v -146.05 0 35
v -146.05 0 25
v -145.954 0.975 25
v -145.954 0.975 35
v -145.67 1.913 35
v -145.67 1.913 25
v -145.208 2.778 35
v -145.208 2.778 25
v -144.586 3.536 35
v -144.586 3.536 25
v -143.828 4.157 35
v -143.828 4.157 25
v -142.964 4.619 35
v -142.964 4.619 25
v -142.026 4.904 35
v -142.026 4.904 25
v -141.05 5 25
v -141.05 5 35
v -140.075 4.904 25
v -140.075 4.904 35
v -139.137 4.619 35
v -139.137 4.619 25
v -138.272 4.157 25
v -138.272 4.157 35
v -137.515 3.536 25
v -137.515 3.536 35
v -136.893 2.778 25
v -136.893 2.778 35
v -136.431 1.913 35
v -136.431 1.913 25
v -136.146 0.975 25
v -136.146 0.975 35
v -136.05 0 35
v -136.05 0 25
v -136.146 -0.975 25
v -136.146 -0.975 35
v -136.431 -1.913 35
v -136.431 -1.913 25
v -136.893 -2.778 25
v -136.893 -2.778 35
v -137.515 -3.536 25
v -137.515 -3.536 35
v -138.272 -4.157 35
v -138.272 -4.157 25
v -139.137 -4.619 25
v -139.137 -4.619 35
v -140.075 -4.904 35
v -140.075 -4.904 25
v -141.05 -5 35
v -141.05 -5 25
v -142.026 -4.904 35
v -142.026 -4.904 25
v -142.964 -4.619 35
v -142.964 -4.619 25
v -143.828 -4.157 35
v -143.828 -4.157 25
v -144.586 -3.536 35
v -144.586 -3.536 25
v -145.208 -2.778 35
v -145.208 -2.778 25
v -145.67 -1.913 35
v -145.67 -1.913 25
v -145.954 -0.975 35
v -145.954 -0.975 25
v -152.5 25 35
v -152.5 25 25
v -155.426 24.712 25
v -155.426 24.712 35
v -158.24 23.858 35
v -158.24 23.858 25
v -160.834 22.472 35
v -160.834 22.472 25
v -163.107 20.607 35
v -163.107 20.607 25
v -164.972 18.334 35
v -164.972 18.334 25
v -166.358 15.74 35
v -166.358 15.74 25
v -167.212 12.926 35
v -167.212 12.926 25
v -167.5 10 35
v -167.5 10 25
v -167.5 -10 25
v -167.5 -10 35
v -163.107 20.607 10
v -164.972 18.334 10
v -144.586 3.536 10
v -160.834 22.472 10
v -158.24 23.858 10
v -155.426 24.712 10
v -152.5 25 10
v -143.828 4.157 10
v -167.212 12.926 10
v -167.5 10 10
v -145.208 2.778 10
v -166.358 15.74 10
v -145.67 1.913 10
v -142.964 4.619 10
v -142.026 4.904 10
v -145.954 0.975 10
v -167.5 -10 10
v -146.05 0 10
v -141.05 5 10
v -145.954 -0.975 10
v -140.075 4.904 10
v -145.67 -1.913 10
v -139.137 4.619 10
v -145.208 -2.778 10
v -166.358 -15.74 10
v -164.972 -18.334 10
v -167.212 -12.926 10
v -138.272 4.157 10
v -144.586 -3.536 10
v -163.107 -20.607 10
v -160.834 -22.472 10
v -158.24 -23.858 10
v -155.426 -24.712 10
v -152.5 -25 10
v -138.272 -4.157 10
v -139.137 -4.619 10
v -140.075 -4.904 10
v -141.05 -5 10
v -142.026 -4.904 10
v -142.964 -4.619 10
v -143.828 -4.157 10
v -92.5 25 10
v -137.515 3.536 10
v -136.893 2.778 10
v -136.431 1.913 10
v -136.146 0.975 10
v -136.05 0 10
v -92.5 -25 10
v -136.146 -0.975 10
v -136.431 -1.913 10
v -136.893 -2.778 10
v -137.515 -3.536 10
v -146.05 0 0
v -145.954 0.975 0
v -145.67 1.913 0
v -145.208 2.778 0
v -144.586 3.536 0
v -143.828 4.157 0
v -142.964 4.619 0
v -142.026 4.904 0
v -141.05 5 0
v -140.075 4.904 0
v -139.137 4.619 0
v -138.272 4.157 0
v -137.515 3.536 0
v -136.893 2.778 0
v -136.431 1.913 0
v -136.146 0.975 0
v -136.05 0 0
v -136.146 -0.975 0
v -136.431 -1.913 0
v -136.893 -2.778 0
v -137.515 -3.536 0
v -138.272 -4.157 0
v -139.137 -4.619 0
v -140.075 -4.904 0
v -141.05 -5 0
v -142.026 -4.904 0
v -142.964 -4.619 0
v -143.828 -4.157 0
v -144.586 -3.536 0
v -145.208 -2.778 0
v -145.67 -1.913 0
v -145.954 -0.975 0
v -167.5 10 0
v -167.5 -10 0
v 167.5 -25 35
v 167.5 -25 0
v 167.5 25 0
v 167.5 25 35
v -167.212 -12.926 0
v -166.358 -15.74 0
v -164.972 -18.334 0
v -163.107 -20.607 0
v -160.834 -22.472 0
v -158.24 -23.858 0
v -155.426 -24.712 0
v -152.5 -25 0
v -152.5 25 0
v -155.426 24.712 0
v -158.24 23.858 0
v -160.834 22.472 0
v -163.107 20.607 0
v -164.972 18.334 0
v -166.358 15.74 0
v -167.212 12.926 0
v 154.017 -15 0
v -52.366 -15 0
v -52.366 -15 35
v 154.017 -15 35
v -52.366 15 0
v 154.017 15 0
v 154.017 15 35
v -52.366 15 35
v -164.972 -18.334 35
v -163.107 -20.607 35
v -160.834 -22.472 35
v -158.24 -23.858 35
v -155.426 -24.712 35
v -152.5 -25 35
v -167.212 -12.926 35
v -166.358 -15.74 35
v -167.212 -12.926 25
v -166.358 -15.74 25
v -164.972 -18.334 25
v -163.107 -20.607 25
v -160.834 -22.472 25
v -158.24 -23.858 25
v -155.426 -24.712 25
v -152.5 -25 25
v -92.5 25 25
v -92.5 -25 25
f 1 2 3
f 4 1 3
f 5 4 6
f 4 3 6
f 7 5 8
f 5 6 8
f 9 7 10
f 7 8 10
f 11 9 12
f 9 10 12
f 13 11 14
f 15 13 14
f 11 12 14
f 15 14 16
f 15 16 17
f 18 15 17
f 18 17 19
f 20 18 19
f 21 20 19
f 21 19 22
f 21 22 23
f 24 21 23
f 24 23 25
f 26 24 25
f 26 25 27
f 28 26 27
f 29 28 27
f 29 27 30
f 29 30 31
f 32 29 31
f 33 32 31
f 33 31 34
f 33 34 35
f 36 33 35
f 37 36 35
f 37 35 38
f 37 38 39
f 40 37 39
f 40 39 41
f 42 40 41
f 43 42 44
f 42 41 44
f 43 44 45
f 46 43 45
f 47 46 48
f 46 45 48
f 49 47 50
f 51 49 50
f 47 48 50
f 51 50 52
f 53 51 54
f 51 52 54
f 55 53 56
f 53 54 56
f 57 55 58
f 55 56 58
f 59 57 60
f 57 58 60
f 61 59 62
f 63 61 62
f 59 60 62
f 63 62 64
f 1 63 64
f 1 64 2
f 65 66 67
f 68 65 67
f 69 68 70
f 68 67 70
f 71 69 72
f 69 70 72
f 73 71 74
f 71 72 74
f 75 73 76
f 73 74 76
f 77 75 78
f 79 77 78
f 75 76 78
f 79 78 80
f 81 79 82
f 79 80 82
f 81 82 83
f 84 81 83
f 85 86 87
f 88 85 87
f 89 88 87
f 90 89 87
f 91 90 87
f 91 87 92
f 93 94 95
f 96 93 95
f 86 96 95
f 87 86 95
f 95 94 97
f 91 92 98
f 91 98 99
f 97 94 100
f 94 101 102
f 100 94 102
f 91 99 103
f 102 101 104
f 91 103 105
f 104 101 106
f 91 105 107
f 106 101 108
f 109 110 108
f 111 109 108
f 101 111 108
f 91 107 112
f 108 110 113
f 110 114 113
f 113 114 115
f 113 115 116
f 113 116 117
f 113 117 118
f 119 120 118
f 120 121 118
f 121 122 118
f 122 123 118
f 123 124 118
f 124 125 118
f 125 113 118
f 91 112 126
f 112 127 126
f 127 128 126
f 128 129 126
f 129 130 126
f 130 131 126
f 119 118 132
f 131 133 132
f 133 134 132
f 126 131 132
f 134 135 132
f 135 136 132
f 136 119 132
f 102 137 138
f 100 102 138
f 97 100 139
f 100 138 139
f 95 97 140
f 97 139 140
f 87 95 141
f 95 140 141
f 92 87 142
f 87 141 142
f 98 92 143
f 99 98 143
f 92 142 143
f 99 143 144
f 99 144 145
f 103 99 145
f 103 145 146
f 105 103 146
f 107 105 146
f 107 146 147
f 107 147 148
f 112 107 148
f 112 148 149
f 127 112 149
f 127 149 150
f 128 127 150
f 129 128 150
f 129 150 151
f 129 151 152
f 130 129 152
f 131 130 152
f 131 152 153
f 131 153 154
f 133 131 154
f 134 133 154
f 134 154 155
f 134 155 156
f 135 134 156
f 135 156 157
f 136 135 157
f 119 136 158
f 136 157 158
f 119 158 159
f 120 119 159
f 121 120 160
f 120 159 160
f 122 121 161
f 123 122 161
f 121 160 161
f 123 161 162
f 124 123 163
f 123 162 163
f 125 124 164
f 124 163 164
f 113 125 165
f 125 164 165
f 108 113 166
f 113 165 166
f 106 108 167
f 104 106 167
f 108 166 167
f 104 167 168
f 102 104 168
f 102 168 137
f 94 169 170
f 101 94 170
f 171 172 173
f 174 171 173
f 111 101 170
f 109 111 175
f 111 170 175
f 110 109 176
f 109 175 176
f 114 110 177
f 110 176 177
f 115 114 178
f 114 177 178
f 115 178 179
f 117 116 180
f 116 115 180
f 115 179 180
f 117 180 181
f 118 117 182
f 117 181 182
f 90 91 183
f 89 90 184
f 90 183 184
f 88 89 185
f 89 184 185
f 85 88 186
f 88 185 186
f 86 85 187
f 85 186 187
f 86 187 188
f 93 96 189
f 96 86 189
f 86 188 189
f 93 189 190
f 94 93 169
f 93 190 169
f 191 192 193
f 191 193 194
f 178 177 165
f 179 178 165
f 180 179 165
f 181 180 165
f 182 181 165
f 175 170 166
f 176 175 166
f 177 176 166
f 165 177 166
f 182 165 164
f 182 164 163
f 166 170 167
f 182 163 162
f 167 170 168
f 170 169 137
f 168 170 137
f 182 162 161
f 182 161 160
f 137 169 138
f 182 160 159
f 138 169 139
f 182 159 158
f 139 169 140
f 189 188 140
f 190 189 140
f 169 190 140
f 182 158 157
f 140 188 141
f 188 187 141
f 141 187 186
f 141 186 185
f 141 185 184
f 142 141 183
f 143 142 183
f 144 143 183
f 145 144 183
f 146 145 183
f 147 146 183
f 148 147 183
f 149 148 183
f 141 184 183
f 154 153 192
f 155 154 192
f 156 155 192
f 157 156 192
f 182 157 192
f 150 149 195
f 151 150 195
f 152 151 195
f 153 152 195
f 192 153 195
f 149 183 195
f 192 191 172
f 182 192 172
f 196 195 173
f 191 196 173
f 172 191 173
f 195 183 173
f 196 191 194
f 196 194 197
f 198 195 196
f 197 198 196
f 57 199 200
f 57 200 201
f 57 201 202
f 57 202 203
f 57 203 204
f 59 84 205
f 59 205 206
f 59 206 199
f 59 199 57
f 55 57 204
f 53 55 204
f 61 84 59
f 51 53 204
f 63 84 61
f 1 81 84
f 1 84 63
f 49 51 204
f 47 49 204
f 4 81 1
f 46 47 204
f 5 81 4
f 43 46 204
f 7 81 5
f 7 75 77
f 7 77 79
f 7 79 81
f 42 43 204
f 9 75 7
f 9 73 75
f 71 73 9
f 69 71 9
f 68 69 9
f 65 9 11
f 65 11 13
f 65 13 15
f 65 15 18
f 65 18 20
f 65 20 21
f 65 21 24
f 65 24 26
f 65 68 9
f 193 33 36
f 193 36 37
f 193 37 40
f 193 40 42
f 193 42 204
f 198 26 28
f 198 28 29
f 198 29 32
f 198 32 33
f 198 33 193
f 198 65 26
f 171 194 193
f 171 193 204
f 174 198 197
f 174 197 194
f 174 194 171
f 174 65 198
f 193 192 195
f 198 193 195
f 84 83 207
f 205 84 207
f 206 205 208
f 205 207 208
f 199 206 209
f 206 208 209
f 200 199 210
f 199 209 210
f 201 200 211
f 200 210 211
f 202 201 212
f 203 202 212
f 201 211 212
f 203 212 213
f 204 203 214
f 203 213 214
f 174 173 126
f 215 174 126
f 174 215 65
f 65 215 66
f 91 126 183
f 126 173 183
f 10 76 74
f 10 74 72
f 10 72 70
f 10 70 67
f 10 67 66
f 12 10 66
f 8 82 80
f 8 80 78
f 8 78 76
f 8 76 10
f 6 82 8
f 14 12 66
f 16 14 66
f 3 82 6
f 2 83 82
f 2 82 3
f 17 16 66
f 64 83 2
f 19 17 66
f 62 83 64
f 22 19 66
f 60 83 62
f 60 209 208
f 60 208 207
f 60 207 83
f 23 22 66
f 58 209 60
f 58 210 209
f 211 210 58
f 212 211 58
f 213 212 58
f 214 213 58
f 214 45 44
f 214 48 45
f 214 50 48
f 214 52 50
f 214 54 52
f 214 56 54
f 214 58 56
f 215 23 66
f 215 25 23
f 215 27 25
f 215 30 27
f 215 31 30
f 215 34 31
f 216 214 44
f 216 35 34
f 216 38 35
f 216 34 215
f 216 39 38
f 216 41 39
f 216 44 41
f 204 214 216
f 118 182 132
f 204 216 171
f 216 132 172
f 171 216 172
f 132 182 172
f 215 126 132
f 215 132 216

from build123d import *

# Parameters (mm, degrees)
SKETCH3_W           = 206.383928572
SKETCH3_H           = 30
BOSS_EXTRUDE1_DEPTH = 35
CUT_EXTRUDE2_REACH  = 180.273
SKETCH5_W           = 75
SKETCH5_H           = 15
SKETCH6_R           = 5
CUT_EXTRUDE3_DEPTH  = 173.934236055


with BuildPart() as part:
    # Sketch3 → Boss-Extrude1 (new body)
    with BuildSketch(Plane.XY):
        with BuildLine():
            Line((-167.5, 10), (-167.5, -10))
            ThreePointArc((-167.5, -10), (-163.106601718, -20.606601718), (-152.5, -25))
            Line((-152.5, -25), (167.5, -25))
            Line((167.5, -25), (167.5, 25))
            Line((167.5, 25), (-152.5, 25))
            ThreePointArc((-152.5, 25), (-163.106601718, 20.606601718), (-167.5, 10))
        make_face()
        with Locations((50.825520553, 0)):
            Rectangle(SKETCH3_W, SKETCH3_H, mode=Mode.SUBTRACT)
    extrude(amount=BOSS_EXTRUDE1_DEPTH)

    # Sketch5 → Cut-Extrude2 (cut, up to next)
    with BuildSketch(Plane.XZ.offset(25), mode=Mode.PRIVATE) as cut_extrude2_sk1:
        with Locations((-130, 17.5)):
            Rectangle(SKETCH5_W, SKETCH5_H)
    cut_extrude2_tool1 = extrude(cut_extrude2_sk1.sketch, amount=-CUT_EXTRUDE2_REACH, mode=Mode.PRIVATE) & part.part
    add(cut_extrude2_tool1.solids().sort_by_distance((-130, -25, 17.5))[0], mode=Mode.SUBTRACT)

    # Sketch6 → Cut-Extrude3 (cut, through all)
    with BuildSketch(Plane(origin=(0, 0, 0), x_dir=(-1, 0, 0), z_dir=(0, 0, -1))):
        with Locations((141.050190179, 0)):
            Circle(SKETCH6_R)
    extrude(amount=-CUT_EXTRUDE3_DEPTH, mode=Mode.SUBTRACT)


solid = part.part
